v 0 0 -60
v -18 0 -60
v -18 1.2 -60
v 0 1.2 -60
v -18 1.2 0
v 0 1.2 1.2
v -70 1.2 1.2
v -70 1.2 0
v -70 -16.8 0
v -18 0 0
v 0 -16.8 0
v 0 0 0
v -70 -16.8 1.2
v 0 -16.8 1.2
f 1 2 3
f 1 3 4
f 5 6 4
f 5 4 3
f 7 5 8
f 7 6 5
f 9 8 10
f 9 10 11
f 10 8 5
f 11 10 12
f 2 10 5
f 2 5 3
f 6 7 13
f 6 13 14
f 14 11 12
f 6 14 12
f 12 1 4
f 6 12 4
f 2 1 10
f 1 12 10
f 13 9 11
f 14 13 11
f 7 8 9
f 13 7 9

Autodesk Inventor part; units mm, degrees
ref_plane "YZ Plane" through (0, 0, 0) normal (1, 0, 0) x (0, 1, 0)
ref_plane "XZ Plane" through (0, 0, 0) normal (0, 1, 0) x (-1, 0, 0)
ref_plane "XY Plane" through (0, 0, 0) normal (0, 0, 1) x (1, 0, 0)
sketch "Sketch1" plane through (0, 0, 0) normal (0, 1, 0) x (-1, 0, 0)
  line L0 (0, 0) -> (18, 0)
  line L1 (18, 0) -> (18, -60)
  line L2 (18, -60) -> (0, -60)
  line L3 (0, -60) -> (0, 0)
  dimension "d0" = 18
  dimension "d1" = 60
extrude "Extrusion1" add sketch "Sketch1" along normal blind 1.2
sketch "Sketch3" plane through (-18, 0, 0) normal (0, 0, 1) x (1, 0, 0)
  line L0 (0, 1.2) -> (18, 1.2) projected
  line L1 (18, 1.2) -> (-52, 1.2)
  line L2 (-52, 1.2) -> (-52, -16.8)
  line L3 (-52, -16.8) -> (18, -16.8)
  line L4 (18, -16.8) -> (18, 1.2)
  point P0 (18, 0)
  dimension "d4" = 70
  dimension "d5" = 18
extrude "Extrusion2" add sketch "Sketch3" along normal blind 1.2
properties part number "Giá đỡ 1"
